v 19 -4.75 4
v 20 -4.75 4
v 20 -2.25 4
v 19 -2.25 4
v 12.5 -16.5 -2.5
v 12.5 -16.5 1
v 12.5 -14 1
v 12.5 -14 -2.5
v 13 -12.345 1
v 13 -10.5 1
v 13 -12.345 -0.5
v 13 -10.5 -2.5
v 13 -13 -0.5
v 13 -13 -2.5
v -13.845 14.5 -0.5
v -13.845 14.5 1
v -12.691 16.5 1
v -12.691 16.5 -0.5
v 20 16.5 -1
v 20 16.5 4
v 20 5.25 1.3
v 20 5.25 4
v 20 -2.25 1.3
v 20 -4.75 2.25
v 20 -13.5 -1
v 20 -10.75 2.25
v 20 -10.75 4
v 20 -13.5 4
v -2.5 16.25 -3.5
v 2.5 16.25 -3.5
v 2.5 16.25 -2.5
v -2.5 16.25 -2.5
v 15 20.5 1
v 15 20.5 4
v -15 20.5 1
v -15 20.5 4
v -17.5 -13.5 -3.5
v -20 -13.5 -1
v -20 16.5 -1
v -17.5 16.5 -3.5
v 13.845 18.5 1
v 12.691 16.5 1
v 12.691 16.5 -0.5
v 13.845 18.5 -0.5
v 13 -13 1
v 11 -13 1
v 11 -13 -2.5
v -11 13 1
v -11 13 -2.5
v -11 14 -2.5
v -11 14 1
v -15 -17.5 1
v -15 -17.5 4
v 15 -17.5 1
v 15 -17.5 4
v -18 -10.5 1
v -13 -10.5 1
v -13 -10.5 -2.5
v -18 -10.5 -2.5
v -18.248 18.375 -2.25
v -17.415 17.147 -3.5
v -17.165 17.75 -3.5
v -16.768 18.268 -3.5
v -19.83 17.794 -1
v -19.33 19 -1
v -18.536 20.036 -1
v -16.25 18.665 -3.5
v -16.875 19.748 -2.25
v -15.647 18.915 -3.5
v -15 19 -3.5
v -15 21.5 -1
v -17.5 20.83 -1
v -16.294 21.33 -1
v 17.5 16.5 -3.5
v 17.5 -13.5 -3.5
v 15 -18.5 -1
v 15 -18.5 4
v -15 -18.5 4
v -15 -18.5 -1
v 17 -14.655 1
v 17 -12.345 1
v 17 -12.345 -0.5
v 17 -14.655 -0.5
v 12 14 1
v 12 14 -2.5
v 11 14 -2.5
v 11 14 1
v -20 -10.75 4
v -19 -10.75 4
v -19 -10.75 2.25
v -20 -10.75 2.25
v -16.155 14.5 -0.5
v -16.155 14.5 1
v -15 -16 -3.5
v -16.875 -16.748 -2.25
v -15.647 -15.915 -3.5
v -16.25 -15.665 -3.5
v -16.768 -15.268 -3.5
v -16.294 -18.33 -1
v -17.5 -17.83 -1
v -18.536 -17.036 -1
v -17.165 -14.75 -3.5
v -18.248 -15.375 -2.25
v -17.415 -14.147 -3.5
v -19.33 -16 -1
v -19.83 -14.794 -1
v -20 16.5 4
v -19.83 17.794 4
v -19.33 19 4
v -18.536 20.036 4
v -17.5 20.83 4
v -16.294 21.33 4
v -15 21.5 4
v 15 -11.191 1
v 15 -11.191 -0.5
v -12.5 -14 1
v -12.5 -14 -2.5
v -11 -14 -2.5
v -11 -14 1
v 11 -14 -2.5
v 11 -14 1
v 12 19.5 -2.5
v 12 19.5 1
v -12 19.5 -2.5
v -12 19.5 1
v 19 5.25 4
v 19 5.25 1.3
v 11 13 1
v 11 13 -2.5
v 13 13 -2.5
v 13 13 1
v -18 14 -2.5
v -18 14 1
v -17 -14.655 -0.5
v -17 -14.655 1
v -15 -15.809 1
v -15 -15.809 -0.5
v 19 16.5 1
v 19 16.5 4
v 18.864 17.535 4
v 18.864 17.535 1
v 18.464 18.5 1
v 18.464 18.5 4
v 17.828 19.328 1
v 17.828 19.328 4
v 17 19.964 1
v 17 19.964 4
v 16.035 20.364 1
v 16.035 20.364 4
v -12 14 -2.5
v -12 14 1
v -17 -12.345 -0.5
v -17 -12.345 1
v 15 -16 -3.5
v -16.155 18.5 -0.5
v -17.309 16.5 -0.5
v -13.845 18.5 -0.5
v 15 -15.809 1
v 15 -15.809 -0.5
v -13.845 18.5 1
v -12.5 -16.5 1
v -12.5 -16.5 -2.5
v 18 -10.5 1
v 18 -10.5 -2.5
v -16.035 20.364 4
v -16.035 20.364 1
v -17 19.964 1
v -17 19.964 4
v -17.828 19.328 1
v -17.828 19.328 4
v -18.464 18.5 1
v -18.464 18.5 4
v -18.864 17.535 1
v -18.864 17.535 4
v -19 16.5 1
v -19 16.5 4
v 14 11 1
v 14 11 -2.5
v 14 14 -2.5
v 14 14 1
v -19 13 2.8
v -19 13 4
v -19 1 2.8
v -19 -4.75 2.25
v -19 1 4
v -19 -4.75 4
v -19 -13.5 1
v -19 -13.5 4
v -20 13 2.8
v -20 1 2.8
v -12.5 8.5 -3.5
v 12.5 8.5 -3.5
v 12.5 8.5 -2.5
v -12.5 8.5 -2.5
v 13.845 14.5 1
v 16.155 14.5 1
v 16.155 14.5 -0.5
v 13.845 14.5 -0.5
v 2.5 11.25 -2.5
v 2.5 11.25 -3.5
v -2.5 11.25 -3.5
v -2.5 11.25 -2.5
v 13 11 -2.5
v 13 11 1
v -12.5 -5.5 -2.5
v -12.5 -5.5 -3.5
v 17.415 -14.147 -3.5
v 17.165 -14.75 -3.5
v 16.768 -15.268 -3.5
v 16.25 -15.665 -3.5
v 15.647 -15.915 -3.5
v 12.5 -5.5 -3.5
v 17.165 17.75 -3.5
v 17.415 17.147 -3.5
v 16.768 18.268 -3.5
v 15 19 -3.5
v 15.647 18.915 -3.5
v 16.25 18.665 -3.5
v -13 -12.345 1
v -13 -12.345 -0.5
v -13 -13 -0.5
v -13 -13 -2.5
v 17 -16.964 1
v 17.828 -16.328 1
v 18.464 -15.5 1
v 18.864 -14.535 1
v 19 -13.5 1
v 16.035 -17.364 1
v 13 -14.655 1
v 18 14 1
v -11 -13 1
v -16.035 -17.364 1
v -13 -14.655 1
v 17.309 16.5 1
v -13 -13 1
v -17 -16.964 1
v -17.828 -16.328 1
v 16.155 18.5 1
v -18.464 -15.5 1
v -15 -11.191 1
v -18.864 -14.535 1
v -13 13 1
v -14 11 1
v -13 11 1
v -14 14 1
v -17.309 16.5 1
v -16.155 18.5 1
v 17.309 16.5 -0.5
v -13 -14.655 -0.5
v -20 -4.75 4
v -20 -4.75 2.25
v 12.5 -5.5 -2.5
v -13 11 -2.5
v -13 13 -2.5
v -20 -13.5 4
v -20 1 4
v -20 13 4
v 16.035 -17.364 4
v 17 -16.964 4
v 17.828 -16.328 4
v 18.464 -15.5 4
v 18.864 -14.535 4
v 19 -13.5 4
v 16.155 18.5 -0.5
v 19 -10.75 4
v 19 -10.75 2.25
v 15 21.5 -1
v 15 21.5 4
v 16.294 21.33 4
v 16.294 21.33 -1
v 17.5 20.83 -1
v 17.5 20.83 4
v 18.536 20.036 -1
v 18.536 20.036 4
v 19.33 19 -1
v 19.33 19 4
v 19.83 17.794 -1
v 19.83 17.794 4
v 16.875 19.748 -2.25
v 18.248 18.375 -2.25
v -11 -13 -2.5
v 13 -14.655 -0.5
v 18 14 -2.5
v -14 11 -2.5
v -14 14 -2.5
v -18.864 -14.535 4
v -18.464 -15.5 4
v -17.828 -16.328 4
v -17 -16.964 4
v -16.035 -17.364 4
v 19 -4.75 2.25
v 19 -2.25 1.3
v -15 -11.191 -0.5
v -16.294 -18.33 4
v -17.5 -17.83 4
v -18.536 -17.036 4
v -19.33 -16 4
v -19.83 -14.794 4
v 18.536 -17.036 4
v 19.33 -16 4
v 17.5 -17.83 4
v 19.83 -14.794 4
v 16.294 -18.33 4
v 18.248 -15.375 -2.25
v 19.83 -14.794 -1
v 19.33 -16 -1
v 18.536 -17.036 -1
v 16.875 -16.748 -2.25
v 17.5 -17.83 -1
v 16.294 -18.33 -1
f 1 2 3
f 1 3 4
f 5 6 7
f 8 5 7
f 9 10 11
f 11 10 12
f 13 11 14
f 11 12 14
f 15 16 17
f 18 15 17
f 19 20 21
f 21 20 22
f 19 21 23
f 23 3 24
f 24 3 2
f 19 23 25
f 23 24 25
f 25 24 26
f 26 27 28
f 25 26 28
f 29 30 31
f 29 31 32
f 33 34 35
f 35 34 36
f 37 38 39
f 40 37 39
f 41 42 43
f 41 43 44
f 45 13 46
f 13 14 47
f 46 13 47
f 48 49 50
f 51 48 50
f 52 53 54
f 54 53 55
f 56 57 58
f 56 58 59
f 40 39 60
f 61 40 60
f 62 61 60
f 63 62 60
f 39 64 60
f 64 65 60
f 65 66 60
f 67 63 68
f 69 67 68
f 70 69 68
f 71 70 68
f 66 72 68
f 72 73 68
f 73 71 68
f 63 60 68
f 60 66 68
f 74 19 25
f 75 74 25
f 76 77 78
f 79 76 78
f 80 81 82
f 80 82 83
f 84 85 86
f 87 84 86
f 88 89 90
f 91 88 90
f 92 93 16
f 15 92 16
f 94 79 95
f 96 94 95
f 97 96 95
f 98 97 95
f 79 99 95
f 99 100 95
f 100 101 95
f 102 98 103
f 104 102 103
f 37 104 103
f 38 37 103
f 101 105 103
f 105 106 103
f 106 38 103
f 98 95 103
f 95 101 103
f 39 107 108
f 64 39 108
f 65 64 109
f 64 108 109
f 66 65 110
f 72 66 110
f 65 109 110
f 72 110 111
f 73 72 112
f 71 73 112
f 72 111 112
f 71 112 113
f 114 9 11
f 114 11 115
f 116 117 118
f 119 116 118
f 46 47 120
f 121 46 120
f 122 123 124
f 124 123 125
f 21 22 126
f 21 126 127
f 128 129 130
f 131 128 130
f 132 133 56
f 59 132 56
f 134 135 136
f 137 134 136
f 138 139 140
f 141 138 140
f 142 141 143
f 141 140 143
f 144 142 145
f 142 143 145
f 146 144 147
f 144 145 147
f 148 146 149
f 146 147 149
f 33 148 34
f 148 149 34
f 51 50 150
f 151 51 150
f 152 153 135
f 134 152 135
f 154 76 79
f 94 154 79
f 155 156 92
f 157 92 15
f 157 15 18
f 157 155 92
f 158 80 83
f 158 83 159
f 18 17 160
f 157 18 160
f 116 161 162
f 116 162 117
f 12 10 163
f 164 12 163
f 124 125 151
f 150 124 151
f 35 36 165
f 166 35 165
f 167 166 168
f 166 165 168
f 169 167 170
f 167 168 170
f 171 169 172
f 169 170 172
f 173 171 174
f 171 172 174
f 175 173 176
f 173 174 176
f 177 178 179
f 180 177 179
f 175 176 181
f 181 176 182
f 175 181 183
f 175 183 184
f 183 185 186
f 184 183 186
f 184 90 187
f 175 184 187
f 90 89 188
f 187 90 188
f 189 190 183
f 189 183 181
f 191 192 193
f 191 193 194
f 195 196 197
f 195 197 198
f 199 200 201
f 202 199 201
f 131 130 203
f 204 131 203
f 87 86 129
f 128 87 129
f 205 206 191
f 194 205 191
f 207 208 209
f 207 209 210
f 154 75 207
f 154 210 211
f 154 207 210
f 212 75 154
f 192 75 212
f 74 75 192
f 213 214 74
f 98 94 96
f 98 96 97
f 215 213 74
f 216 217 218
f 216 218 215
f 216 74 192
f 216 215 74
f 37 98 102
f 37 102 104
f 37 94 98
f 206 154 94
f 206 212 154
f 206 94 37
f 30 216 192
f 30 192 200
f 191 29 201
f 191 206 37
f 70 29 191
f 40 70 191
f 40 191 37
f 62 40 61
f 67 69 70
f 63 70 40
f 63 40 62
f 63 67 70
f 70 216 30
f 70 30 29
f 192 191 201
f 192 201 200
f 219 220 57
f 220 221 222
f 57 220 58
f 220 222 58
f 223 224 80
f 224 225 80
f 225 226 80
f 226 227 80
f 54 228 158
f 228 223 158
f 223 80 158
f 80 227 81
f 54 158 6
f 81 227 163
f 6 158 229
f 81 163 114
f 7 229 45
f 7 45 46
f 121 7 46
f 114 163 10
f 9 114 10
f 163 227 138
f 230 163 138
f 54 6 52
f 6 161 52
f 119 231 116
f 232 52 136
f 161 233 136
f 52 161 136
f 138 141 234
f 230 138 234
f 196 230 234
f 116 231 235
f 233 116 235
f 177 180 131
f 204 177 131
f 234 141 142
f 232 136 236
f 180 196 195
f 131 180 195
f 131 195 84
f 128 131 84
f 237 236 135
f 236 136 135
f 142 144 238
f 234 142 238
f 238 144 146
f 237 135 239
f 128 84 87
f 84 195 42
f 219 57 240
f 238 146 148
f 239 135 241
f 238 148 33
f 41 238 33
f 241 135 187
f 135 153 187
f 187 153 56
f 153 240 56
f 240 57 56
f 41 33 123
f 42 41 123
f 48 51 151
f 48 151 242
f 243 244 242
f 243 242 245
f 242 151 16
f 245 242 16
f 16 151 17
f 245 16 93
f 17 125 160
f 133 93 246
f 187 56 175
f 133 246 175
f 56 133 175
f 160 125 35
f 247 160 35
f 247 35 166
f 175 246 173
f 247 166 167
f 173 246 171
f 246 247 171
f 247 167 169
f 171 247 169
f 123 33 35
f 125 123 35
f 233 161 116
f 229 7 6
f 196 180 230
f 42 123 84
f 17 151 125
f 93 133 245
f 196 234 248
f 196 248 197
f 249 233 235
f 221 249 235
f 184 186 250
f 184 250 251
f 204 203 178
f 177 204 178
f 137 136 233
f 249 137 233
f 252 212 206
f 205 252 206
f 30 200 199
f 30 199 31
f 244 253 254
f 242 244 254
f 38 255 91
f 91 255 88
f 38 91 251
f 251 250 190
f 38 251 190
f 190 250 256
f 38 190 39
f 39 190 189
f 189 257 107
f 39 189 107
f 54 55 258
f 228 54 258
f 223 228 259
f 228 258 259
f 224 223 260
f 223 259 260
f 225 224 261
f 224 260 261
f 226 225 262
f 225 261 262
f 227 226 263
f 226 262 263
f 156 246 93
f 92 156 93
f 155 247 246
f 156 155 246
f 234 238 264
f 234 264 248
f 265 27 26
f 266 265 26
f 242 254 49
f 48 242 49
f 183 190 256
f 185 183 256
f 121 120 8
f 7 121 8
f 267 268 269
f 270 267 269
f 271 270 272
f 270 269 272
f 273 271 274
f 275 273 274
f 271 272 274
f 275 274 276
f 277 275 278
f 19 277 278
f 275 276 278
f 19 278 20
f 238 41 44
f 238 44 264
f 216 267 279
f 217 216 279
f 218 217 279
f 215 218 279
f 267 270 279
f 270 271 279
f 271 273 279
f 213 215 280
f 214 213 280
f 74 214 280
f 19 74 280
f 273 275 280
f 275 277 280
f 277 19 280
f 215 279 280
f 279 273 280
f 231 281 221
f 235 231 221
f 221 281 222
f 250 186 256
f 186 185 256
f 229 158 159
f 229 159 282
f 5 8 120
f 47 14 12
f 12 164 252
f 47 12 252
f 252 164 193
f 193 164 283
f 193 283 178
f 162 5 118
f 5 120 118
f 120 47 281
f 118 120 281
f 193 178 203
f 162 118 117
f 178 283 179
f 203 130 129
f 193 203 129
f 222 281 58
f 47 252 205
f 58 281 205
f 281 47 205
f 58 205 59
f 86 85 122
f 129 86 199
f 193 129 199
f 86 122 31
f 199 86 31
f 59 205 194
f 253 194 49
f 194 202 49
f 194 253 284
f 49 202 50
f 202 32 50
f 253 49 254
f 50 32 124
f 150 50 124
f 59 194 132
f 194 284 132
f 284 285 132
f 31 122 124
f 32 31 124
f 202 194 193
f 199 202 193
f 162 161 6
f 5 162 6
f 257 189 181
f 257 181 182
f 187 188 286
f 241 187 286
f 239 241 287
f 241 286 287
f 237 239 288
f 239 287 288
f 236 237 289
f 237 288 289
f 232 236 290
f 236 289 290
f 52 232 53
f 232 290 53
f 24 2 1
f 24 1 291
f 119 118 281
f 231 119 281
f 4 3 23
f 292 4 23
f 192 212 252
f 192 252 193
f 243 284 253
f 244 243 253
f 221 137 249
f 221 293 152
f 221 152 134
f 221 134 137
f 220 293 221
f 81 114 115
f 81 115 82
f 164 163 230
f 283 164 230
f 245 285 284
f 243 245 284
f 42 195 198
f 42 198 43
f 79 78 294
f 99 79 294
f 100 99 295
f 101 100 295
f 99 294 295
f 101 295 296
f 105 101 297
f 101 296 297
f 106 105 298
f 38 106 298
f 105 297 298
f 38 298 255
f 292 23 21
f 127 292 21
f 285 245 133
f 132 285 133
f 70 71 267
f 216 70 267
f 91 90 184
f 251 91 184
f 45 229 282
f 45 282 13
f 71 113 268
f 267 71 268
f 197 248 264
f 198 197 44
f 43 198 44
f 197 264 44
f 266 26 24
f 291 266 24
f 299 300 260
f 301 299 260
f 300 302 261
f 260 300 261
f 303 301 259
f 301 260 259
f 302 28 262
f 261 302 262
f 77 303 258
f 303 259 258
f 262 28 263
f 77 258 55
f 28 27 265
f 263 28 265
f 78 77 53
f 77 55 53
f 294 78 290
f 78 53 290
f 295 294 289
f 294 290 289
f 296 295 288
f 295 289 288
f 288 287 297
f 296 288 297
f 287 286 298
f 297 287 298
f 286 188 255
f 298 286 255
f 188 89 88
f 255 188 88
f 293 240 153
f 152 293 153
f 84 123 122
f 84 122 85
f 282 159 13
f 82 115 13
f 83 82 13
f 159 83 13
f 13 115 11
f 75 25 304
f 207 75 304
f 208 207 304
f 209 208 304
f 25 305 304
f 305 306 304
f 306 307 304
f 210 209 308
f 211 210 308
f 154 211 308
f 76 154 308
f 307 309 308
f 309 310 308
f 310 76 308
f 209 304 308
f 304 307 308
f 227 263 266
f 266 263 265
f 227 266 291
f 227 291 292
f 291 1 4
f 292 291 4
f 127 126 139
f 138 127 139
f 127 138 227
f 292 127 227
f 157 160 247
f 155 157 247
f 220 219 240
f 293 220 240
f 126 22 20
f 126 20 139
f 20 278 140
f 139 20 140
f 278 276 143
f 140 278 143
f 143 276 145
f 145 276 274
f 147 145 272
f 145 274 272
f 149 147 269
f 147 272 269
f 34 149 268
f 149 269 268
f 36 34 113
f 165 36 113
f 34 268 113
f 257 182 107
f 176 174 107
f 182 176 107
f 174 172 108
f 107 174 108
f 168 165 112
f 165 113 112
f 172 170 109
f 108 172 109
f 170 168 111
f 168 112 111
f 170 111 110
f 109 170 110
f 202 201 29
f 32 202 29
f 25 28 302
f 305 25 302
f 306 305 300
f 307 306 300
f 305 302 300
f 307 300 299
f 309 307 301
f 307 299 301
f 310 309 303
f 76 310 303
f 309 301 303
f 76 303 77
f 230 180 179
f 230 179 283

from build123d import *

# Parameters (mm, degrees)
EXTRUDE_1_DEPTH     = 1
SKETCH_3_W          = 25
SKETCH_3_H          = 14
CUT_EXTRUDE_1_DEPTH = 30.381116385
EXTRUDE_START       = 6.5
EXTRUDE_2_DEPTH     = 6.5
EXTRUDE_START_2     = 3.5
EXTRUDE_3_DEPTH     = 3.5
EXTRUDE_4_DEPTH     = 3.5
CHAMFER_1_SIZE      = 2.5
EXTRUDE_5_DEPTH     = 3.5
EXTRUDE_6_DEPTH     = 3.5
CUT_EXTRUDE_2_DEPTH = 1.5
CUT_EXTRUDE_3_DEPTH = 1.5
CUT_EXTRUDE_4_REACH = 47.588
SKETCH_12_W         = 1.75
SKETCH_12_H         = 6
SKETCH_12_W_2       = 2.7
SKETCH_12_H_2       = 7.5
CUT_EXTRUDE_5_REACH = 47.588
SKETCH_13_W         = 1.2
SKETCH_13_H         = 12
SKETCH_14_W         = 5
SKETCH_14_H         = 5
CUT_EXTRUDE_6_DEPTH = 1.5
SKETCH_12_2_W       = 1.75
SKETCH_12_2_H       = 6
CUT_EXTRUDE_7_DEPTH = 46.587827323


with BuildPart() as part:
    # 草圖2 → 填料-伸長1 (new body)
    with BuildSketch(Plane(origin=(0, 0, -2.5), x_dir=(-1, 0, 0), z_dir=(0, 0, -1))):
        with BuildLine():
            Line((-15, -18.5), (15, -18.5))
            ThreePointArc((15, -18.5), (18.535533906, -17.035533906), (20, -13.5))
            Line((20, -13.5), (20, 16.5))
            ThreePointArc((20, 16.5), (18.535533906, 20.035533906), (15, 21.5))
            Line((15, 21.5), (-15, 21.5))
            ThreePointArc((-15, 21.5), (-18.535533906, 20.035533906), (-20, 16.5))
            Line((-20, 16.5), (-20, -13.5))
            ThreePointArc((-20, -13.5), (-18.535533906, -17.035533906), (-15, -18.5))
        make_face()
    extrude(amount=EXTRUDE_1_DEPTH)

    # 草圖3 → 除料-伸長1 (cut, through all)
    with BuildSketch(Plane(origin=(0, 0, -3.5), x_dir=(-1, 0, 0), z_dir=(0, 0, -1))):
        with Locations((0, 1.5)):
            Rectangle(SKETCH_3_W, SKETCH_3_H)
    extrude(amount=-CUT_EXTRUDE_1_DEPTH, mode=Mode.SUBTRACT)

    # 草圖4 → 填料-伸長2 (add)
    with BuildSketch(Plane.XY.offset(-2.5).offset(EXTRUDE_START)):
        with BuildLine():
            Line((15, -18.5), (-15, -18.5))
            ThreePointArc((-15, -18.5), (-18.535533906, -17.035533906), (-20, -13.5))
            Line((-20, -13.5), (-20, 16.5))
            ThreePointArc((-20, 16.5), (-18.535533906, 20.035533906), (-15, 21.5))
            Line((-15, 21.5), (15, 21.5))
            ThreePointArc((15, 21.5), (18.535533906, 20.035533906), (20, 16.5))
            Line((20, 16.5), (20, -13.5))
            ThreePointArc((20, -13.5), (18.535533906, -17.035533906), (15, -18.5))
        make_face()
        with BuildLine():
            Line((19, -13.5), (19, 16.5))
            ThreePointArc((19, 16.5), (17.828427125, 19.328427125), (15, 20.5))
            Line((15, 20.5), (-15, 20.5))
            ThreePointArc((-15, 20.5), (-17.828427125, 19.328427125), (-19, 16.5))
            Line((-19, 16.5), (-19, -13.5))
            ThreePointArc((-19, -13.5), (-17.828427125, -16.328427125), (-15, -17.5))
            Line((-15, -17.5), (15, -17.5))
            ThreePointArc((15, -17.5), (17.828427125, -16.328427125), (19, -13.5))
        make_face(mode=Mode.SUBTRACT)
    extrude(amount=-EXTRUDE_2_DEPTH)

    # 草圖5 → 填料-伸長3 (add)
    with BuildSketch(Plane.XY.offset(-2.5).offset(EXTRUDE_START_2)):
        with BuildLine():
            Line((19, -13.5), (19, 16.5))
            ThreePointArc((19, 16.5), (17.828427125, 19.328427125), (15, 20.5))
            Line((15, 20.5), (-15, 20.5))
            ThreePointArc((-15, 20.5), (-17.828427125, 19.328427125), (-19, 16.5))
            Line((-19, 16.5), (-19, -13.5))
            ThreePointArc((-19, -13.5), (-17.828427125, -16.328427125), (-15, -17.5))
            Line((-15, -17.5), (15, -17.5))
            ThreePointArc((15, -17.5), (17.828427125, -16.328427125), (19, -13.5))
        make_face()
        with BuildLine():
            Line((18, -13.5), (18, 16.5))
            ThreePointArc((18, 16.5), (17.121320344, 18.621320344), (15, 19.5))
            Line((15, 19.5), (-15, 19.5))
            ThreePointArc((-15, 19.5), (-17.121320344, 18.621320344), (-18, 16.5))
            Line((-18, 16.5), (-18, -13.5))
            ThreePointArc((-18, -13.5), (-17.121320344, -15.621320344), (-15, -16.5))
            Line((-15, -16.5), (15, -16.5))
            ThreePointArc((15, -16.5), (17.121320344, -15.621320344), (18, -13.5))
        make_face(mode=Mode.SUBTRACT)
    extrude(amount=-EXTRUDE_3_DEPTH)

    # 草圖6 → 填料-伸長4 (add)
    with BuildSketch(Plane.XY.offset(-2.5)):
        Polygon((14, -14), (14, -10.5), (13, -10.5), (13, -13), (11, -13), (11, -14), align=None)
        Polygon((14, 14), (11, 14), (11, 13), (13, 13), (13, 11), (14, 11), align=None)
        Polygon((-14, 14), (-14, 11), (-13, 11), (-13, 13), (-11, 13), (-11, 14), align=None)
        Polygon((-14, -14), (-11, -14), (-11, -13), (-13, -13), (-13, -10.5), (-14, -10.5), align=None)
    extrude(amount=EXTRUDE_4_DEPTH)

    # 導角1
    chamfer_1_edges = [part.edges().sort_by_distance(p)[0] for p in [
        (18.535533906, -17.035533906, -3.5),
        (0, -18.5, -3.5),
        (-18.535533906, -17.035533906, -3.5),
        (-20, 1.5, -3.5),
        (-18.535533906, 20.035533906, -3.5),
        (0, 21.5, -3.5),
        (18.535533906, 20.035533906, -3.5),
        (20, 1.5, -3.5),
    ]]
    chamfer(chamfer_1_edges, length=CHAMFER_1_SIZE)

    # 草圖7 → 填料-伸長5 (add)
    with BuildSketch(Plane.XY.offset(-2.5).offset(EXTRUDE_START_2)):
        with BuildLine():
            Line((-12, 19.5), (-12, 14))
            Line((-12, 14), (-18, 14))
            Line((-18, 14), (-18, 16.5))
            ThreePointArc((-18, 16.5), (-17.121320344, 18.621320344), (-15, 19.5))
            Line((-15, 19.5), (-12, 19.5))
        make_face()
    extrude_5 = extrude(amount=-EXTRUDE_5_DEPTH)

    # 草圖8 → 填料-伸長6 (add)
    with BuildSketch(Plane.XY.offset(-2.5).offset(EXTRUDE_START_2)):
        with BuildLine():
            Line((-12.5, -16.5), (-12.5, -14))
            Line((-12.5, -14), (-14, -14))
            Line((-14, -14), (-14, -10.5))
            Line((-14, -10.5), (-18, -10.5))
            Line((-18, -10.5), (-18, -13.5))
            ThreePointArc((-18, -13.5), (-17.121320344, -15.621320344), (-15, -16.5))
            Line((-15, -16.5), (-12.5, -16.5))
        make_face()
    extrude_6 = extrude(amount=-EXTRUDE_6_DEPTH)

    # 鏡射2: 填料-伸長5, 填料-伸長6 across plane
    add(extrude_5.mirror(Plane(origin=(0, 0, 0), x_dir=(0, 0, 1), z_dir=(1, 0, 0))))
    add(extrude_6.mirror(Plane(origin=(0, 0, 0), x_dir=(0, 0, 1), z_dir=(1, 0, 0))))

    # 草圖10 → 除料-伸長2 (cut)
    with BuildSketch(Plane.XY.offset(1)):
        Polygon((-15, -15.809401077), (-13, -14.654700538), (-13, -12.345299462), (-15, -11.190598923), (-17, -12.345299462), (-17, -14.654700538), align=None)
    cut_extrude_2 = extrude(amount=-CUT_EXTRUDE_2_DEPTH, mode=Mode.SUBTRACT)

    # 草圖11 → 除料-伸長3 (cut)
    with BuildSketch(Plane.XY.offset(1)):
        Polygon((-17.309401077, 16.5), (-16.154700538, 14.5), (-13.845299462, 14.5), (-12.690598923, 16.5), (-13.845299462, 18.5), (-16.154700538, 18.5), align=None)
    cut_extrude_3 = extrude(amount=-CUT_EXTRUDE_3_DEPTH, mode=Mode.SUBTRACT)

    # 鏡射3: 除料-伸長2, 除料-伸長3 across plane
    add(cut_extrude_2.mirror(Plane(origin=(0, 0, 0), x_dir=(0, 0, 1), z_dir=(1, 0, 0))), mode=Mode.SUBTRACT)
    add(cut_extrude_3.mirror(Plane(origin=(0, 0, 0), x_dir=(0, 0, 1), z_dir=(1, 0, 0))), mode=Mode.SUBTRACT)

    # 草圖12 → 除料-伸長4 (cut, up to next)
    with BuildSketch(Plane(origin=(20, 0, 0), x_dir=(0, 0, -1), z_dir=(1, 0, 0)), mode=Mode.PRIVATE) as cut_extrude_4_sk1:
        with Locations((-3.125, -7.75)):
            Rectangle(SKETCH_12_W, SKETCH_12_H)
    cut_extrude_4_tool1 = extrude(cut_extrude_4_sk1.sketch, amount=-CUT_EXTRUDE_4_REACH, mode=Mode.PRIVATE) & part.part
    # 草圖12 → 除料-伸長4 (cut, up to next)
    with BuildSketch(Plane(origin=(20, 0, 0), x_dir=(0, 0, -1), z_dir=(1, 0, 0)), mode=Mode.PRIVATE) as cut_extrude_4_sk2:
        with Locations((-2.65, 1.5)):
            Rectangle(SKETCH_12_W_2, SKETCH_12_H_2)
    cut_extrude_4_tool2 = extrude(cut_extrude_4_sk2.sketch, amount=-CUT_EXTRUDE_4_REACH, mode=Mode.PRIVATE) & part.part
    add(cut_extrude_4_tool1.solids().sort_by_distance((20, -7.75, 3.125))[0], mode=Mode.SUBTRACT)
    add(cut_extrude_4_tool2.solids().sort_by_distance((20, 1.5, 2.65))[0], mode=Mode.SUBTRACT)

    # 草圖13 → 除料-伸長5 (cut, up to next)
    with BuildSketch(Plane.ZY.offset(20), mode=Mode.PRIVATE) as cut_extrude_5_sk1:
        with Locations((3.4, 7)):
            Rectangle(SKETCH_13_W, SKETCH_13_H)
    cut_extrude_5_tool1 = extrude(cut_extrude_5_sk1.sketch, amount=-CUT_EXTRUDE_5_REACH, mode=Mode.PRIVATE) & part.part
    add(cut_extrude_5_tool1.solids().sort_by_distance((-20, 7, 3.4))[0], mode=Mode.SUBTRACT)

    # 草圖14 → 除料-伸長6 (cut)
    with BuildSketch(Plane(origin=(0, 0, -3.5), x_dir=(-1, 0, 0), z_dir=(0, 0, -1))):
        with Locations((0, 13.75)):
            Rectangle(SKETCH_14_W, SKETCH_14_H)
    extrude(amount=-CUT_EXTRUDE_6_DEPTH, mode=Mode.SUBTRACT)

    # 草圖12<2> → 除料-伸長7 (cut, through all)
    with BuildSketch(Plane(origin=(20, 0, 0), x_dir=(0, 0, -1), z_dir=(1, 0, 0))):
        with Locations((-3.125, -7.75)):
            Rectangle(SKETCH_12_2_W, SKETCH_12_2_H)
    extrude(amount=-CUT_EXTRUDE_7_DEPTH, mode=Mode.SUBTRACT)


solid = part.part
